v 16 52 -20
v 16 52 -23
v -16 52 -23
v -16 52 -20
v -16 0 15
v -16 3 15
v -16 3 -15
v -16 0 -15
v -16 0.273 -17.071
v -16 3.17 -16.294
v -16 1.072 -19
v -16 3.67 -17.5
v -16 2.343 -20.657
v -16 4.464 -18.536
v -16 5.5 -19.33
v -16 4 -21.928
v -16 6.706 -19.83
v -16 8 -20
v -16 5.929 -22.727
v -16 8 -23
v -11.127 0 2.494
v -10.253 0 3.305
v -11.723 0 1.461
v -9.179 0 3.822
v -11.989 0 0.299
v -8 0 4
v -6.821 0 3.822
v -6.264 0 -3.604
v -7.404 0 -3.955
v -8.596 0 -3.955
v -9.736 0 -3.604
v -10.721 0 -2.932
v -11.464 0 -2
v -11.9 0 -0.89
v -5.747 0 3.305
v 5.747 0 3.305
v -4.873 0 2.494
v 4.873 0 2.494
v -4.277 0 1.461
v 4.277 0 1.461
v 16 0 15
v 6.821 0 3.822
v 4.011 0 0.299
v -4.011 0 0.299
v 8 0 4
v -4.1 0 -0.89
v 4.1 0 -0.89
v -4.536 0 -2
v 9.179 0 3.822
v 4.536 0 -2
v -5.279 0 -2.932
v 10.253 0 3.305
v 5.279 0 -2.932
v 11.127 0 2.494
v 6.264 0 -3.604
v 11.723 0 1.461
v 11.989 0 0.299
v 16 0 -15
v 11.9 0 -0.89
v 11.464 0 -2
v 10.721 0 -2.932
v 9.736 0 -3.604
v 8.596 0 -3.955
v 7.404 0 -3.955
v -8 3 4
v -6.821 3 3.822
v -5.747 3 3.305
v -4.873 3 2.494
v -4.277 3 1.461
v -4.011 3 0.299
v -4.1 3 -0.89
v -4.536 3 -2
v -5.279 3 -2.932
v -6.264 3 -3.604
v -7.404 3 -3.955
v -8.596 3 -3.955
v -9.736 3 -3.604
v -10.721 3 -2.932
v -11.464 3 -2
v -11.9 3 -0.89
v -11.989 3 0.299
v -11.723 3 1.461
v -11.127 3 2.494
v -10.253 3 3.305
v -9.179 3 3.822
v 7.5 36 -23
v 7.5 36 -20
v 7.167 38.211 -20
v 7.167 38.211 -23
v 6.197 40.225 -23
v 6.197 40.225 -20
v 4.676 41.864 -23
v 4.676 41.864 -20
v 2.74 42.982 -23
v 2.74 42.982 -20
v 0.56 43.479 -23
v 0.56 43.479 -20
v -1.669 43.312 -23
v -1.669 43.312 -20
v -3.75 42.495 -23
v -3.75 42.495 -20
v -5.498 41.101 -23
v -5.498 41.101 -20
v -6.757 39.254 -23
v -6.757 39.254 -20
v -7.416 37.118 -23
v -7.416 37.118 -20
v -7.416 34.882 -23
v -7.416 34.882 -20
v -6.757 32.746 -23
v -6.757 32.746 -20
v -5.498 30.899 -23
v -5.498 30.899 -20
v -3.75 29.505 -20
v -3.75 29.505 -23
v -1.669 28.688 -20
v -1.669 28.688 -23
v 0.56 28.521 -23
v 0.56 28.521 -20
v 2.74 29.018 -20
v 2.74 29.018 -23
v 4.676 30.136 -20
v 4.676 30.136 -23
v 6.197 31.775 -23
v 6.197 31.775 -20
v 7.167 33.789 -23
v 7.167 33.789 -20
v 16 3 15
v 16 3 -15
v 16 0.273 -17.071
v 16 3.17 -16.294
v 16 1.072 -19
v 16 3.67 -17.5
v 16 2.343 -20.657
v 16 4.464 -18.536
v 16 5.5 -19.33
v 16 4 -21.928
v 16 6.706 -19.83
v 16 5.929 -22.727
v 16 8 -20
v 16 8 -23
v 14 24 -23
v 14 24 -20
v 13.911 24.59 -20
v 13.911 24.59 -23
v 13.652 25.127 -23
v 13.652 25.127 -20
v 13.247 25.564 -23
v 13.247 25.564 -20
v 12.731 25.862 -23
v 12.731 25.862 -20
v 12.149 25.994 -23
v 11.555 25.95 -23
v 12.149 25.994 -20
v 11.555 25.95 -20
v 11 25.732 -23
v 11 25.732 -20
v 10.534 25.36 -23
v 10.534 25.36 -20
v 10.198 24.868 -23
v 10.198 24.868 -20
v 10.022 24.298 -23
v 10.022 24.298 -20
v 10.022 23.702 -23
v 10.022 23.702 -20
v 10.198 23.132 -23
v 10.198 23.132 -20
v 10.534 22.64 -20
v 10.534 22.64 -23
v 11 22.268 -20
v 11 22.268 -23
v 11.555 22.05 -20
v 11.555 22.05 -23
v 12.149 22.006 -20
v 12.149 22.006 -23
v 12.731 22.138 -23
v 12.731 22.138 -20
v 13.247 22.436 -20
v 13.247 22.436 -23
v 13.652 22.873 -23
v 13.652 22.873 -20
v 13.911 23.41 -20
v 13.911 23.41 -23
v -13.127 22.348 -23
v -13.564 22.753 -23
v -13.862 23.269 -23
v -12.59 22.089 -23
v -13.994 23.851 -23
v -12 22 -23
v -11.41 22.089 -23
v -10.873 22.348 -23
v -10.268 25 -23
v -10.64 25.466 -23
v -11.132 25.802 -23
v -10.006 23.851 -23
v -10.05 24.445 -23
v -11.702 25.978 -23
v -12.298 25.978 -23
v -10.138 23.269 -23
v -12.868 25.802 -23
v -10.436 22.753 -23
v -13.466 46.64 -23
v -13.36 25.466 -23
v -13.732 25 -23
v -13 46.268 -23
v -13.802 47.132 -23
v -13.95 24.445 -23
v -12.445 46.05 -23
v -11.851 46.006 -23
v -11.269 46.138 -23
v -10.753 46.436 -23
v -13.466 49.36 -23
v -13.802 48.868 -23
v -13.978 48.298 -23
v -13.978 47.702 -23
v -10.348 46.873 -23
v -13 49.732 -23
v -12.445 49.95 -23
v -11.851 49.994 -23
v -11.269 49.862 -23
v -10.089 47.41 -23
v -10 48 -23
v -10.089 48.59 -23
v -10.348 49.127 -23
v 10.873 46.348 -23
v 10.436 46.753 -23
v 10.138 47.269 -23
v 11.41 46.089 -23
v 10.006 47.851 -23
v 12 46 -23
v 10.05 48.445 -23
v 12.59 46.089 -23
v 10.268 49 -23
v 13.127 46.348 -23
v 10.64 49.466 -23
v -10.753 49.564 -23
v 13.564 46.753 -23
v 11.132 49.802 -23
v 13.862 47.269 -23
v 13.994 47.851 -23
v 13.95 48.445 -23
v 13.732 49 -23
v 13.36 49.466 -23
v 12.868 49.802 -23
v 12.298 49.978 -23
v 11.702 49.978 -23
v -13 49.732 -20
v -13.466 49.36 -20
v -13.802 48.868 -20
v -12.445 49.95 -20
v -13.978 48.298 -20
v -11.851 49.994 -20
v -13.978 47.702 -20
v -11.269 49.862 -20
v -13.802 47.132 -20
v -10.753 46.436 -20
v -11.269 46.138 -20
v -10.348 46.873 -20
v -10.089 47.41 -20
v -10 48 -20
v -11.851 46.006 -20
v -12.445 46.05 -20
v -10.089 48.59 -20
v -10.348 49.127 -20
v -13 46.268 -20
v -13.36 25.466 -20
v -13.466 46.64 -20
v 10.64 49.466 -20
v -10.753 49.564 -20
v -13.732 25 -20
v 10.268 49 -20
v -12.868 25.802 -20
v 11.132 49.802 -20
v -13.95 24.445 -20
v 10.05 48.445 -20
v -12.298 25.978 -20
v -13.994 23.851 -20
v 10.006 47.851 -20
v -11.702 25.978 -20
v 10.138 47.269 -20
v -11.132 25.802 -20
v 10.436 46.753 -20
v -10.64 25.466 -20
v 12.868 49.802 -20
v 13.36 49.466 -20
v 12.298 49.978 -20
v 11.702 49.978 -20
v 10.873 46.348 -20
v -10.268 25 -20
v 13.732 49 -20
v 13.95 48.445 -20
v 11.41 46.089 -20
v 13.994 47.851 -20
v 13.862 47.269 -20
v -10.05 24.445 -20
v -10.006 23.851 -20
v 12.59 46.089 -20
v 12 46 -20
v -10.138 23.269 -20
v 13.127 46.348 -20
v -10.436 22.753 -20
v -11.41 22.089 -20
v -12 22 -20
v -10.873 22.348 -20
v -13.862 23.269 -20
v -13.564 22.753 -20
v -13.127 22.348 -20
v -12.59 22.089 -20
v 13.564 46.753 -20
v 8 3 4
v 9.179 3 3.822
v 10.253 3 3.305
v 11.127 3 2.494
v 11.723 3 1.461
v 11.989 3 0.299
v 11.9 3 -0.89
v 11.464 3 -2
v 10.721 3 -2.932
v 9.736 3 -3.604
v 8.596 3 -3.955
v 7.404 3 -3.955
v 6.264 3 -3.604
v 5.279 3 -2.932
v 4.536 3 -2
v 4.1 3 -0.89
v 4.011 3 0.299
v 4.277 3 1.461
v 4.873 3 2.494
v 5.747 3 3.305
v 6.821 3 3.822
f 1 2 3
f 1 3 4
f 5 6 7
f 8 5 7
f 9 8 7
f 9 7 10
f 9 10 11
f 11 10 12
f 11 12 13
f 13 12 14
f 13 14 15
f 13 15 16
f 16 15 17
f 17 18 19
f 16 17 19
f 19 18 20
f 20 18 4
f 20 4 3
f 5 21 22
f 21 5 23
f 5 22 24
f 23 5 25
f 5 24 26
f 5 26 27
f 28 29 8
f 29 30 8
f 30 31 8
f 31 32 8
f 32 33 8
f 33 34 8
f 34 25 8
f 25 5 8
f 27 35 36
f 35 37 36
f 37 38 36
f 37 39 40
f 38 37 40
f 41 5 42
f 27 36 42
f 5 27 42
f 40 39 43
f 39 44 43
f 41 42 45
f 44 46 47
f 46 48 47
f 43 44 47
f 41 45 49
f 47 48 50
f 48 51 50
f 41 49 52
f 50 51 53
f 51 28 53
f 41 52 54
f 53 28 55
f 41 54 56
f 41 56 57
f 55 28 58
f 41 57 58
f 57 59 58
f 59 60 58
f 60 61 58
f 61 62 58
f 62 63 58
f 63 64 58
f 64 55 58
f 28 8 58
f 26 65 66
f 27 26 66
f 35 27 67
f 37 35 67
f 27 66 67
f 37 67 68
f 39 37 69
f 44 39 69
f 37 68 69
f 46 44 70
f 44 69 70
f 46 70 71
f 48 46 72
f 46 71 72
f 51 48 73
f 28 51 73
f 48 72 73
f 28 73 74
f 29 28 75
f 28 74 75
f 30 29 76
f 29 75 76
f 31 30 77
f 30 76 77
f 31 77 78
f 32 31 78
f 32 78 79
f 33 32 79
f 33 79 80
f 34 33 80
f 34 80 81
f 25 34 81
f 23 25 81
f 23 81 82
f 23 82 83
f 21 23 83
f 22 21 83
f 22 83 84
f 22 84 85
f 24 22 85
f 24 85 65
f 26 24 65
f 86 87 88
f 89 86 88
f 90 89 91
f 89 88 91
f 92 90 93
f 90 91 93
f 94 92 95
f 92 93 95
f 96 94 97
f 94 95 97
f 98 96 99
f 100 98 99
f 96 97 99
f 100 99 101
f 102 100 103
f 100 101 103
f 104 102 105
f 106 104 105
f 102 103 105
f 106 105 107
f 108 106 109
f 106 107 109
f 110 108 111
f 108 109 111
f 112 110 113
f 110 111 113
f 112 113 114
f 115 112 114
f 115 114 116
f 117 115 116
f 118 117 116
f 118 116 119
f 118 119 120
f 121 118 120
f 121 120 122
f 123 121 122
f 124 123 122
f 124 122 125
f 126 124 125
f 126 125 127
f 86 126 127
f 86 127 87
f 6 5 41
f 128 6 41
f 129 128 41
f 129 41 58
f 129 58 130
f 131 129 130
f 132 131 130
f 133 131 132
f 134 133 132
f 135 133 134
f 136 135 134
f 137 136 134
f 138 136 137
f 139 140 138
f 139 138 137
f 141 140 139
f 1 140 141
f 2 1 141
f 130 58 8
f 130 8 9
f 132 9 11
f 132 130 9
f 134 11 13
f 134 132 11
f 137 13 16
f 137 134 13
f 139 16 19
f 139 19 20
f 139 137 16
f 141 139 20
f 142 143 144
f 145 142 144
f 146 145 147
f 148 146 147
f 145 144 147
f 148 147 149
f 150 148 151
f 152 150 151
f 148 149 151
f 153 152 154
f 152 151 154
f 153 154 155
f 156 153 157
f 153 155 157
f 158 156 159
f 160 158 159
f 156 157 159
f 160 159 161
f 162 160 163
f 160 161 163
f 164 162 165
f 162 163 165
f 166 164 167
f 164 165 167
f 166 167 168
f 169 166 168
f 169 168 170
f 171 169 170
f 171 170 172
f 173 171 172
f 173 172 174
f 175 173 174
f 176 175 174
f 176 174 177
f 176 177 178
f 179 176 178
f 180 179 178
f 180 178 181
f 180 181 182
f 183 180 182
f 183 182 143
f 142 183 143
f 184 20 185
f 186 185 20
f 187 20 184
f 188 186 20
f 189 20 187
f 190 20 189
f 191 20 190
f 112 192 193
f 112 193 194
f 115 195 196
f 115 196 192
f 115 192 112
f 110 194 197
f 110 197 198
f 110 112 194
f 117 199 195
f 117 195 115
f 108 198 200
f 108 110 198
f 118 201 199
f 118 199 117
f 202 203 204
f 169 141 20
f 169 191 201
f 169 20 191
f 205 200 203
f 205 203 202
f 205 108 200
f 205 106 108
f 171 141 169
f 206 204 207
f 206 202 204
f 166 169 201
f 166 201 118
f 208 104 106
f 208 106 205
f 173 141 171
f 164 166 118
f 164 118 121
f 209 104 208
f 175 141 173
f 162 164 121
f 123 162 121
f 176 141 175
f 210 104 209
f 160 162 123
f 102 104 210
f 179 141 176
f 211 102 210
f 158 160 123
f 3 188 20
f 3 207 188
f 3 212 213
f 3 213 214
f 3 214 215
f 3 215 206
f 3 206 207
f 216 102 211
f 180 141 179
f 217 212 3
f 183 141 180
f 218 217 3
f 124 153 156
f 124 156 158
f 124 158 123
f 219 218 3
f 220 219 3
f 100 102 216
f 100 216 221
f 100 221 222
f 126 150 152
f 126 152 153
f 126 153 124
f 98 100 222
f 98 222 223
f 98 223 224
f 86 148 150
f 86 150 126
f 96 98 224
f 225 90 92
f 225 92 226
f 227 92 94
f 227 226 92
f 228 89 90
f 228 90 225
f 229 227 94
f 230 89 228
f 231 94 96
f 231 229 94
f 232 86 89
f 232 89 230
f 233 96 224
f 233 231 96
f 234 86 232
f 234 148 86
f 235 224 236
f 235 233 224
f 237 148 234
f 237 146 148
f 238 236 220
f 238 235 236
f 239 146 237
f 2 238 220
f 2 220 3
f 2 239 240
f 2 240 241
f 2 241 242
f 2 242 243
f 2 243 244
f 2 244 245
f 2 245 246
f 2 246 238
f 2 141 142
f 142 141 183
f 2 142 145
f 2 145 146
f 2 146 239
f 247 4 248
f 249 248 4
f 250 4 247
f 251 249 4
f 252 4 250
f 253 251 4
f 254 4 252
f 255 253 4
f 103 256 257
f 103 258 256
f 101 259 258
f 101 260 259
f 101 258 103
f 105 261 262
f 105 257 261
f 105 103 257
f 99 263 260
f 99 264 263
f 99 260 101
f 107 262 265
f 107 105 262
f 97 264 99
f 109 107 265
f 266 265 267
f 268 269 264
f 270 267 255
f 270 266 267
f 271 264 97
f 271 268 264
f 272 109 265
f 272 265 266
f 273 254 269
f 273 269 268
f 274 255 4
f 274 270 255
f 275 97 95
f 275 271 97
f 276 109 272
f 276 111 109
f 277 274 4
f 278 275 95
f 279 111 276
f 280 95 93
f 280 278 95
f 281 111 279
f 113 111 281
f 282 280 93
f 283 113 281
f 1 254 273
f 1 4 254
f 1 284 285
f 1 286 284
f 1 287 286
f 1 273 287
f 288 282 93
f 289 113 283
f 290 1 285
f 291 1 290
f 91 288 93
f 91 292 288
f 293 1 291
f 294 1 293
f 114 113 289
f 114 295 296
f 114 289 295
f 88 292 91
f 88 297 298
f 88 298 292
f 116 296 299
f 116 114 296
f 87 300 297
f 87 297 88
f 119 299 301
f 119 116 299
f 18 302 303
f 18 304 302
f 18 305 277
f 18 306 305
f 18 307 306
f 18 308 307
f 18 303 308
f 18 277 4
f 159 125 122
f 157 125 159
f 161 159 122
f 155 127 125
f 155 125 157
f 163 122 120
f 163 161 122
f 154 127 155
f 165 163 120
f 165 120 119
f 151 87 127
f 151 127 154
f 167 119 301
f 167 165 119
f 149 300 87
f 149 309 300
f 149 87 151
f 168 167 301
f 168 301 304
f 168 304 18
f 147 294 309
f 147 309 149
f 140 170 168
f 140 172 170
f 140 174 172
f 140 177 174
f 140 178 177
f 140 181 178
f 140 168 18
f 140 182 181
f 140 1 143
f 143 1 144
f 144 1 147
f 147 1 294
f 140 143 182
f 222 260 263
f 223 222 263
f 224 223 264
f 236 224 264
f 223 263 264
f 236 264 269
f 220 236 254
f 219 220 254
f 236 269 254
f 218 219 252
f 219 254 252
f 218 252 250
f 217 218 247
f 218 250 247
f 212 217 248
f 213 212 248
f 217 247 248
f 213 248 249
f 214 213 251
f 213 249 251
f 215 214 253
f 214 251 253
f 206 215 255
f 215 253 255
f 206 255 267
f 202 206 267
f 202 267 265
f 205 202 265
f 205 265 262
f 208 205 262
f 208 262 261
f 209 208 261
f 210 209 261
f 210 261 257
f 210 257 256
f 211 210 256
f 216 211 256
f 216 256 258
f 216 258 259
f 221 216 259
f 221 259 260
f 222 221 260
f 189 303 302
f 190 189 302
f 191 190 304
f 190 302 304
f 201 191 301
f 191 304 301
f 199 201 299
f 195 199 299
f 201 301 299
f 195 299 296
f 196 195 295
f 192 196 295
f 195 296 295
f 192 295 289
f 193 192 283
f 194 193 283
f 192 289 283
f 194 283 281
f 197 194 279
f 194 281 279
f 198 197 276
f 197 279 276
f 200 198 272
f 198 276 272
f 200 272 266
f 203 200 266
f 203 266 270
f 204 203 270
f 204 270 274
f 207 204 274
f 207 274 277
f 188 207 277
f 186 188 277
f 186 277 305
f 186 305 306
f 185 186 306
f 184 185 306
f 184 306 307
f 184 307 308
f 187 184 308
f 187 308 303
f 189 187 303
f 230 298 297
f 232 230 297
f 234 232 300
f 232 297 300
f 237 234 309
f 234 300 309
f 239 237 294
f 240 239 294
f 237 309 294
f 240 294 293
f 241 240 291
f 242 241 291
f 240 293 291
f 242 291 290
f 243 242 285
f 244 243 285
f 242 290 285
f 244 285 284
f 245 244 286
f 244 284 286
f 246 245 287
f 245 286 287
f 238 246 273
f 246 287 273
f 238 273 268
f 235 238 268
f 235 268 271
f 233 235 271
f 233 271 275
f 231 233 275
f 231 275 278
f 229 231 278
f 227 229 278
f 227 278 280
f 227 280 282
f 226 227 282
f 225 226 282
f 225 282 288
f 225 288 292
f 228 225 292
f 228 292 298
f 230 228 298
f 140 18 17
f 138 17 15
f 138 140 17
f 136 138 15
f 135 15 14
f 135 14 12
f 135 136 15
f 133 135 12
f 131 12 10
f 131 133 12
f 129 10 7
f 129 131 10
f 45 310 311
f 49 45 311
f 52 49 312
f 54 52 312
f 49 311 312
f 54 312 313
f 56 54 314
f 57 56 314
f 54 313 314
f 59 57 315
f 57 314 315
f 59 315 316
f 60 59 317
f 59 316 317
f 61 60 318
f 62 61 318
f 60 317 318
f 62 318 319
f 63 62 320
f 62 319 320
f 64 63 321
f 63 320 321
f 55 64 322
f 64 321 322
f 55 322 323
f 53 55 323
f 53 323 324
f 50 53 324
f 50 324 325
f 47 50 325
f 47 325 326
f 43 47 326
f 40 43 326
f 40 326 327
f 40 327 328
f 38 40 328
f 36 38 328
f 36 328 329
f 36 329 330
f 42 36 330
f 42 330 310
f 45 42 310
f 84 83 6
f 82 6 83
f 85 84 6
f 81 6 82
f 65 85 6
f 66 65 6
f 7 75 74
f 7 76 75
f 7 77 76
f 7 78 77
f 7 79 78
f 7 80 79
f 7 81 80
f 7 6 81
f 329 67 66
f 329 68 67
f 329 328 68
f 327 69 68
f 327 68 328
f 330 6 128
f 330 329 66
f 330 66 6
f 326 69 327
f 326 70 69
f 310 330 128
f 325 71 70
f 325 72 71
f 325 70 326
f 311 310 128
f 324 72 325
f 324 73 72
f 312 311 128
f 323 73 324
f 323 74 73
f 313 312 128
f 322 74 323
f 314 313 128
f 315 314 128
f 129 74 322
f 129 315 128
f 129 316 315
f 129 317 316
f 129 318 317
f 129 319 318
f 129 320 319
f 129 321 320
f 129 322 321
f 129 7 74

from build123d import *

# Parameters (mm, degrees)
SKETCH5_W          = 32
SKETCH5_H          = 30
BASE_FLANGE1_DEPTH = 3
EDGE_FLANGE1_DEPTH = 32
SKETCH13_R         = 4
CUT_EXTRUDE1_DEPTH = 10
SKETCH14_R         = 7.5
SKETCH14_R_2       = 2
CUT_EXTRUDE2_DEPTH = 10


# Sheet-metal steps are written as plain solids
with BuildPart() as part:
    # Sketch5 → Base-Flange1 (new body)
    with BuildSketch(Plane(origin=(0, 0, 0), x_dir=(1, 0, 0), z_dir=(0, 1, 0))):
        Rectangle(SKETCH5_W, SKETCH5_H)
    extrude(amount=BASE_FLANGE1_DEPTH)

    # Edge-Flange1 section (across the edge) → Edge-Flange1 (add)
    with BuildSketch(Plane(origin=(16, 3, -20), x_dir=(0, 0, 1), z_dir=(-1, 0, 0))):
        with BuildLine():
            Line((-3, 5), (-3, 49))
            Line((-3, 49), (0, 49))
            Line((0, 49), (0, 5))
            ThreePointArc((0, 5), (1.464466094, 1.464466094), (5, 0))
            Line((5, 0), (5, -3))
            ThreePointArc((5, -3), (-0.656854249, -0.656854249), (-3, 5))
        make_face()
    extrude(amount=EDGE_FLANGE1_DEPTH)

    # Sketch13 → Cut-Extrude1 (cut)
    with BuildSketch(Plane(origin=(0, 3, 0), x_dir=(1, 0, 0), z_dir=(0, 1, 0))):
        with Locations(Location((-8, 0, 0), (0, 0, 270))):
            Circle(SKETCH13_R)
        with Locations(Location((8, 0, 0), (0, 0, 270))):
            Circle(SKETCH13_R)
    extrude(amount=-CUT_EXTRUDE1_DEPTH, mode=Mode.SUBTRACT)

    # Sketch14 → Cut-Extrude2 (cut)
    with BuildSketch(Plane.XY.offset(-20)):
        with Locations((0, 36)):
            Circle(SKETCH14_R)
        with Locations((-12, 48)):
            Circle(SKETCH14_R_2)
        with Locations(Location((12, 48, 0), (0, 0, 270))):
            Circle(SKETCH14_R_2)
        with Locations((12, 24)):
            Circle(SKETCH14_R_2)
        with Locations(Location((-12, 24, 0), (0, 0, 270))):
            Circle(SKETCH14_R_2)
    extrude(amount=-CUT_EXTRUDE2_DEPTH, mode=Mode.SUBTRACT)


solid = part.part
